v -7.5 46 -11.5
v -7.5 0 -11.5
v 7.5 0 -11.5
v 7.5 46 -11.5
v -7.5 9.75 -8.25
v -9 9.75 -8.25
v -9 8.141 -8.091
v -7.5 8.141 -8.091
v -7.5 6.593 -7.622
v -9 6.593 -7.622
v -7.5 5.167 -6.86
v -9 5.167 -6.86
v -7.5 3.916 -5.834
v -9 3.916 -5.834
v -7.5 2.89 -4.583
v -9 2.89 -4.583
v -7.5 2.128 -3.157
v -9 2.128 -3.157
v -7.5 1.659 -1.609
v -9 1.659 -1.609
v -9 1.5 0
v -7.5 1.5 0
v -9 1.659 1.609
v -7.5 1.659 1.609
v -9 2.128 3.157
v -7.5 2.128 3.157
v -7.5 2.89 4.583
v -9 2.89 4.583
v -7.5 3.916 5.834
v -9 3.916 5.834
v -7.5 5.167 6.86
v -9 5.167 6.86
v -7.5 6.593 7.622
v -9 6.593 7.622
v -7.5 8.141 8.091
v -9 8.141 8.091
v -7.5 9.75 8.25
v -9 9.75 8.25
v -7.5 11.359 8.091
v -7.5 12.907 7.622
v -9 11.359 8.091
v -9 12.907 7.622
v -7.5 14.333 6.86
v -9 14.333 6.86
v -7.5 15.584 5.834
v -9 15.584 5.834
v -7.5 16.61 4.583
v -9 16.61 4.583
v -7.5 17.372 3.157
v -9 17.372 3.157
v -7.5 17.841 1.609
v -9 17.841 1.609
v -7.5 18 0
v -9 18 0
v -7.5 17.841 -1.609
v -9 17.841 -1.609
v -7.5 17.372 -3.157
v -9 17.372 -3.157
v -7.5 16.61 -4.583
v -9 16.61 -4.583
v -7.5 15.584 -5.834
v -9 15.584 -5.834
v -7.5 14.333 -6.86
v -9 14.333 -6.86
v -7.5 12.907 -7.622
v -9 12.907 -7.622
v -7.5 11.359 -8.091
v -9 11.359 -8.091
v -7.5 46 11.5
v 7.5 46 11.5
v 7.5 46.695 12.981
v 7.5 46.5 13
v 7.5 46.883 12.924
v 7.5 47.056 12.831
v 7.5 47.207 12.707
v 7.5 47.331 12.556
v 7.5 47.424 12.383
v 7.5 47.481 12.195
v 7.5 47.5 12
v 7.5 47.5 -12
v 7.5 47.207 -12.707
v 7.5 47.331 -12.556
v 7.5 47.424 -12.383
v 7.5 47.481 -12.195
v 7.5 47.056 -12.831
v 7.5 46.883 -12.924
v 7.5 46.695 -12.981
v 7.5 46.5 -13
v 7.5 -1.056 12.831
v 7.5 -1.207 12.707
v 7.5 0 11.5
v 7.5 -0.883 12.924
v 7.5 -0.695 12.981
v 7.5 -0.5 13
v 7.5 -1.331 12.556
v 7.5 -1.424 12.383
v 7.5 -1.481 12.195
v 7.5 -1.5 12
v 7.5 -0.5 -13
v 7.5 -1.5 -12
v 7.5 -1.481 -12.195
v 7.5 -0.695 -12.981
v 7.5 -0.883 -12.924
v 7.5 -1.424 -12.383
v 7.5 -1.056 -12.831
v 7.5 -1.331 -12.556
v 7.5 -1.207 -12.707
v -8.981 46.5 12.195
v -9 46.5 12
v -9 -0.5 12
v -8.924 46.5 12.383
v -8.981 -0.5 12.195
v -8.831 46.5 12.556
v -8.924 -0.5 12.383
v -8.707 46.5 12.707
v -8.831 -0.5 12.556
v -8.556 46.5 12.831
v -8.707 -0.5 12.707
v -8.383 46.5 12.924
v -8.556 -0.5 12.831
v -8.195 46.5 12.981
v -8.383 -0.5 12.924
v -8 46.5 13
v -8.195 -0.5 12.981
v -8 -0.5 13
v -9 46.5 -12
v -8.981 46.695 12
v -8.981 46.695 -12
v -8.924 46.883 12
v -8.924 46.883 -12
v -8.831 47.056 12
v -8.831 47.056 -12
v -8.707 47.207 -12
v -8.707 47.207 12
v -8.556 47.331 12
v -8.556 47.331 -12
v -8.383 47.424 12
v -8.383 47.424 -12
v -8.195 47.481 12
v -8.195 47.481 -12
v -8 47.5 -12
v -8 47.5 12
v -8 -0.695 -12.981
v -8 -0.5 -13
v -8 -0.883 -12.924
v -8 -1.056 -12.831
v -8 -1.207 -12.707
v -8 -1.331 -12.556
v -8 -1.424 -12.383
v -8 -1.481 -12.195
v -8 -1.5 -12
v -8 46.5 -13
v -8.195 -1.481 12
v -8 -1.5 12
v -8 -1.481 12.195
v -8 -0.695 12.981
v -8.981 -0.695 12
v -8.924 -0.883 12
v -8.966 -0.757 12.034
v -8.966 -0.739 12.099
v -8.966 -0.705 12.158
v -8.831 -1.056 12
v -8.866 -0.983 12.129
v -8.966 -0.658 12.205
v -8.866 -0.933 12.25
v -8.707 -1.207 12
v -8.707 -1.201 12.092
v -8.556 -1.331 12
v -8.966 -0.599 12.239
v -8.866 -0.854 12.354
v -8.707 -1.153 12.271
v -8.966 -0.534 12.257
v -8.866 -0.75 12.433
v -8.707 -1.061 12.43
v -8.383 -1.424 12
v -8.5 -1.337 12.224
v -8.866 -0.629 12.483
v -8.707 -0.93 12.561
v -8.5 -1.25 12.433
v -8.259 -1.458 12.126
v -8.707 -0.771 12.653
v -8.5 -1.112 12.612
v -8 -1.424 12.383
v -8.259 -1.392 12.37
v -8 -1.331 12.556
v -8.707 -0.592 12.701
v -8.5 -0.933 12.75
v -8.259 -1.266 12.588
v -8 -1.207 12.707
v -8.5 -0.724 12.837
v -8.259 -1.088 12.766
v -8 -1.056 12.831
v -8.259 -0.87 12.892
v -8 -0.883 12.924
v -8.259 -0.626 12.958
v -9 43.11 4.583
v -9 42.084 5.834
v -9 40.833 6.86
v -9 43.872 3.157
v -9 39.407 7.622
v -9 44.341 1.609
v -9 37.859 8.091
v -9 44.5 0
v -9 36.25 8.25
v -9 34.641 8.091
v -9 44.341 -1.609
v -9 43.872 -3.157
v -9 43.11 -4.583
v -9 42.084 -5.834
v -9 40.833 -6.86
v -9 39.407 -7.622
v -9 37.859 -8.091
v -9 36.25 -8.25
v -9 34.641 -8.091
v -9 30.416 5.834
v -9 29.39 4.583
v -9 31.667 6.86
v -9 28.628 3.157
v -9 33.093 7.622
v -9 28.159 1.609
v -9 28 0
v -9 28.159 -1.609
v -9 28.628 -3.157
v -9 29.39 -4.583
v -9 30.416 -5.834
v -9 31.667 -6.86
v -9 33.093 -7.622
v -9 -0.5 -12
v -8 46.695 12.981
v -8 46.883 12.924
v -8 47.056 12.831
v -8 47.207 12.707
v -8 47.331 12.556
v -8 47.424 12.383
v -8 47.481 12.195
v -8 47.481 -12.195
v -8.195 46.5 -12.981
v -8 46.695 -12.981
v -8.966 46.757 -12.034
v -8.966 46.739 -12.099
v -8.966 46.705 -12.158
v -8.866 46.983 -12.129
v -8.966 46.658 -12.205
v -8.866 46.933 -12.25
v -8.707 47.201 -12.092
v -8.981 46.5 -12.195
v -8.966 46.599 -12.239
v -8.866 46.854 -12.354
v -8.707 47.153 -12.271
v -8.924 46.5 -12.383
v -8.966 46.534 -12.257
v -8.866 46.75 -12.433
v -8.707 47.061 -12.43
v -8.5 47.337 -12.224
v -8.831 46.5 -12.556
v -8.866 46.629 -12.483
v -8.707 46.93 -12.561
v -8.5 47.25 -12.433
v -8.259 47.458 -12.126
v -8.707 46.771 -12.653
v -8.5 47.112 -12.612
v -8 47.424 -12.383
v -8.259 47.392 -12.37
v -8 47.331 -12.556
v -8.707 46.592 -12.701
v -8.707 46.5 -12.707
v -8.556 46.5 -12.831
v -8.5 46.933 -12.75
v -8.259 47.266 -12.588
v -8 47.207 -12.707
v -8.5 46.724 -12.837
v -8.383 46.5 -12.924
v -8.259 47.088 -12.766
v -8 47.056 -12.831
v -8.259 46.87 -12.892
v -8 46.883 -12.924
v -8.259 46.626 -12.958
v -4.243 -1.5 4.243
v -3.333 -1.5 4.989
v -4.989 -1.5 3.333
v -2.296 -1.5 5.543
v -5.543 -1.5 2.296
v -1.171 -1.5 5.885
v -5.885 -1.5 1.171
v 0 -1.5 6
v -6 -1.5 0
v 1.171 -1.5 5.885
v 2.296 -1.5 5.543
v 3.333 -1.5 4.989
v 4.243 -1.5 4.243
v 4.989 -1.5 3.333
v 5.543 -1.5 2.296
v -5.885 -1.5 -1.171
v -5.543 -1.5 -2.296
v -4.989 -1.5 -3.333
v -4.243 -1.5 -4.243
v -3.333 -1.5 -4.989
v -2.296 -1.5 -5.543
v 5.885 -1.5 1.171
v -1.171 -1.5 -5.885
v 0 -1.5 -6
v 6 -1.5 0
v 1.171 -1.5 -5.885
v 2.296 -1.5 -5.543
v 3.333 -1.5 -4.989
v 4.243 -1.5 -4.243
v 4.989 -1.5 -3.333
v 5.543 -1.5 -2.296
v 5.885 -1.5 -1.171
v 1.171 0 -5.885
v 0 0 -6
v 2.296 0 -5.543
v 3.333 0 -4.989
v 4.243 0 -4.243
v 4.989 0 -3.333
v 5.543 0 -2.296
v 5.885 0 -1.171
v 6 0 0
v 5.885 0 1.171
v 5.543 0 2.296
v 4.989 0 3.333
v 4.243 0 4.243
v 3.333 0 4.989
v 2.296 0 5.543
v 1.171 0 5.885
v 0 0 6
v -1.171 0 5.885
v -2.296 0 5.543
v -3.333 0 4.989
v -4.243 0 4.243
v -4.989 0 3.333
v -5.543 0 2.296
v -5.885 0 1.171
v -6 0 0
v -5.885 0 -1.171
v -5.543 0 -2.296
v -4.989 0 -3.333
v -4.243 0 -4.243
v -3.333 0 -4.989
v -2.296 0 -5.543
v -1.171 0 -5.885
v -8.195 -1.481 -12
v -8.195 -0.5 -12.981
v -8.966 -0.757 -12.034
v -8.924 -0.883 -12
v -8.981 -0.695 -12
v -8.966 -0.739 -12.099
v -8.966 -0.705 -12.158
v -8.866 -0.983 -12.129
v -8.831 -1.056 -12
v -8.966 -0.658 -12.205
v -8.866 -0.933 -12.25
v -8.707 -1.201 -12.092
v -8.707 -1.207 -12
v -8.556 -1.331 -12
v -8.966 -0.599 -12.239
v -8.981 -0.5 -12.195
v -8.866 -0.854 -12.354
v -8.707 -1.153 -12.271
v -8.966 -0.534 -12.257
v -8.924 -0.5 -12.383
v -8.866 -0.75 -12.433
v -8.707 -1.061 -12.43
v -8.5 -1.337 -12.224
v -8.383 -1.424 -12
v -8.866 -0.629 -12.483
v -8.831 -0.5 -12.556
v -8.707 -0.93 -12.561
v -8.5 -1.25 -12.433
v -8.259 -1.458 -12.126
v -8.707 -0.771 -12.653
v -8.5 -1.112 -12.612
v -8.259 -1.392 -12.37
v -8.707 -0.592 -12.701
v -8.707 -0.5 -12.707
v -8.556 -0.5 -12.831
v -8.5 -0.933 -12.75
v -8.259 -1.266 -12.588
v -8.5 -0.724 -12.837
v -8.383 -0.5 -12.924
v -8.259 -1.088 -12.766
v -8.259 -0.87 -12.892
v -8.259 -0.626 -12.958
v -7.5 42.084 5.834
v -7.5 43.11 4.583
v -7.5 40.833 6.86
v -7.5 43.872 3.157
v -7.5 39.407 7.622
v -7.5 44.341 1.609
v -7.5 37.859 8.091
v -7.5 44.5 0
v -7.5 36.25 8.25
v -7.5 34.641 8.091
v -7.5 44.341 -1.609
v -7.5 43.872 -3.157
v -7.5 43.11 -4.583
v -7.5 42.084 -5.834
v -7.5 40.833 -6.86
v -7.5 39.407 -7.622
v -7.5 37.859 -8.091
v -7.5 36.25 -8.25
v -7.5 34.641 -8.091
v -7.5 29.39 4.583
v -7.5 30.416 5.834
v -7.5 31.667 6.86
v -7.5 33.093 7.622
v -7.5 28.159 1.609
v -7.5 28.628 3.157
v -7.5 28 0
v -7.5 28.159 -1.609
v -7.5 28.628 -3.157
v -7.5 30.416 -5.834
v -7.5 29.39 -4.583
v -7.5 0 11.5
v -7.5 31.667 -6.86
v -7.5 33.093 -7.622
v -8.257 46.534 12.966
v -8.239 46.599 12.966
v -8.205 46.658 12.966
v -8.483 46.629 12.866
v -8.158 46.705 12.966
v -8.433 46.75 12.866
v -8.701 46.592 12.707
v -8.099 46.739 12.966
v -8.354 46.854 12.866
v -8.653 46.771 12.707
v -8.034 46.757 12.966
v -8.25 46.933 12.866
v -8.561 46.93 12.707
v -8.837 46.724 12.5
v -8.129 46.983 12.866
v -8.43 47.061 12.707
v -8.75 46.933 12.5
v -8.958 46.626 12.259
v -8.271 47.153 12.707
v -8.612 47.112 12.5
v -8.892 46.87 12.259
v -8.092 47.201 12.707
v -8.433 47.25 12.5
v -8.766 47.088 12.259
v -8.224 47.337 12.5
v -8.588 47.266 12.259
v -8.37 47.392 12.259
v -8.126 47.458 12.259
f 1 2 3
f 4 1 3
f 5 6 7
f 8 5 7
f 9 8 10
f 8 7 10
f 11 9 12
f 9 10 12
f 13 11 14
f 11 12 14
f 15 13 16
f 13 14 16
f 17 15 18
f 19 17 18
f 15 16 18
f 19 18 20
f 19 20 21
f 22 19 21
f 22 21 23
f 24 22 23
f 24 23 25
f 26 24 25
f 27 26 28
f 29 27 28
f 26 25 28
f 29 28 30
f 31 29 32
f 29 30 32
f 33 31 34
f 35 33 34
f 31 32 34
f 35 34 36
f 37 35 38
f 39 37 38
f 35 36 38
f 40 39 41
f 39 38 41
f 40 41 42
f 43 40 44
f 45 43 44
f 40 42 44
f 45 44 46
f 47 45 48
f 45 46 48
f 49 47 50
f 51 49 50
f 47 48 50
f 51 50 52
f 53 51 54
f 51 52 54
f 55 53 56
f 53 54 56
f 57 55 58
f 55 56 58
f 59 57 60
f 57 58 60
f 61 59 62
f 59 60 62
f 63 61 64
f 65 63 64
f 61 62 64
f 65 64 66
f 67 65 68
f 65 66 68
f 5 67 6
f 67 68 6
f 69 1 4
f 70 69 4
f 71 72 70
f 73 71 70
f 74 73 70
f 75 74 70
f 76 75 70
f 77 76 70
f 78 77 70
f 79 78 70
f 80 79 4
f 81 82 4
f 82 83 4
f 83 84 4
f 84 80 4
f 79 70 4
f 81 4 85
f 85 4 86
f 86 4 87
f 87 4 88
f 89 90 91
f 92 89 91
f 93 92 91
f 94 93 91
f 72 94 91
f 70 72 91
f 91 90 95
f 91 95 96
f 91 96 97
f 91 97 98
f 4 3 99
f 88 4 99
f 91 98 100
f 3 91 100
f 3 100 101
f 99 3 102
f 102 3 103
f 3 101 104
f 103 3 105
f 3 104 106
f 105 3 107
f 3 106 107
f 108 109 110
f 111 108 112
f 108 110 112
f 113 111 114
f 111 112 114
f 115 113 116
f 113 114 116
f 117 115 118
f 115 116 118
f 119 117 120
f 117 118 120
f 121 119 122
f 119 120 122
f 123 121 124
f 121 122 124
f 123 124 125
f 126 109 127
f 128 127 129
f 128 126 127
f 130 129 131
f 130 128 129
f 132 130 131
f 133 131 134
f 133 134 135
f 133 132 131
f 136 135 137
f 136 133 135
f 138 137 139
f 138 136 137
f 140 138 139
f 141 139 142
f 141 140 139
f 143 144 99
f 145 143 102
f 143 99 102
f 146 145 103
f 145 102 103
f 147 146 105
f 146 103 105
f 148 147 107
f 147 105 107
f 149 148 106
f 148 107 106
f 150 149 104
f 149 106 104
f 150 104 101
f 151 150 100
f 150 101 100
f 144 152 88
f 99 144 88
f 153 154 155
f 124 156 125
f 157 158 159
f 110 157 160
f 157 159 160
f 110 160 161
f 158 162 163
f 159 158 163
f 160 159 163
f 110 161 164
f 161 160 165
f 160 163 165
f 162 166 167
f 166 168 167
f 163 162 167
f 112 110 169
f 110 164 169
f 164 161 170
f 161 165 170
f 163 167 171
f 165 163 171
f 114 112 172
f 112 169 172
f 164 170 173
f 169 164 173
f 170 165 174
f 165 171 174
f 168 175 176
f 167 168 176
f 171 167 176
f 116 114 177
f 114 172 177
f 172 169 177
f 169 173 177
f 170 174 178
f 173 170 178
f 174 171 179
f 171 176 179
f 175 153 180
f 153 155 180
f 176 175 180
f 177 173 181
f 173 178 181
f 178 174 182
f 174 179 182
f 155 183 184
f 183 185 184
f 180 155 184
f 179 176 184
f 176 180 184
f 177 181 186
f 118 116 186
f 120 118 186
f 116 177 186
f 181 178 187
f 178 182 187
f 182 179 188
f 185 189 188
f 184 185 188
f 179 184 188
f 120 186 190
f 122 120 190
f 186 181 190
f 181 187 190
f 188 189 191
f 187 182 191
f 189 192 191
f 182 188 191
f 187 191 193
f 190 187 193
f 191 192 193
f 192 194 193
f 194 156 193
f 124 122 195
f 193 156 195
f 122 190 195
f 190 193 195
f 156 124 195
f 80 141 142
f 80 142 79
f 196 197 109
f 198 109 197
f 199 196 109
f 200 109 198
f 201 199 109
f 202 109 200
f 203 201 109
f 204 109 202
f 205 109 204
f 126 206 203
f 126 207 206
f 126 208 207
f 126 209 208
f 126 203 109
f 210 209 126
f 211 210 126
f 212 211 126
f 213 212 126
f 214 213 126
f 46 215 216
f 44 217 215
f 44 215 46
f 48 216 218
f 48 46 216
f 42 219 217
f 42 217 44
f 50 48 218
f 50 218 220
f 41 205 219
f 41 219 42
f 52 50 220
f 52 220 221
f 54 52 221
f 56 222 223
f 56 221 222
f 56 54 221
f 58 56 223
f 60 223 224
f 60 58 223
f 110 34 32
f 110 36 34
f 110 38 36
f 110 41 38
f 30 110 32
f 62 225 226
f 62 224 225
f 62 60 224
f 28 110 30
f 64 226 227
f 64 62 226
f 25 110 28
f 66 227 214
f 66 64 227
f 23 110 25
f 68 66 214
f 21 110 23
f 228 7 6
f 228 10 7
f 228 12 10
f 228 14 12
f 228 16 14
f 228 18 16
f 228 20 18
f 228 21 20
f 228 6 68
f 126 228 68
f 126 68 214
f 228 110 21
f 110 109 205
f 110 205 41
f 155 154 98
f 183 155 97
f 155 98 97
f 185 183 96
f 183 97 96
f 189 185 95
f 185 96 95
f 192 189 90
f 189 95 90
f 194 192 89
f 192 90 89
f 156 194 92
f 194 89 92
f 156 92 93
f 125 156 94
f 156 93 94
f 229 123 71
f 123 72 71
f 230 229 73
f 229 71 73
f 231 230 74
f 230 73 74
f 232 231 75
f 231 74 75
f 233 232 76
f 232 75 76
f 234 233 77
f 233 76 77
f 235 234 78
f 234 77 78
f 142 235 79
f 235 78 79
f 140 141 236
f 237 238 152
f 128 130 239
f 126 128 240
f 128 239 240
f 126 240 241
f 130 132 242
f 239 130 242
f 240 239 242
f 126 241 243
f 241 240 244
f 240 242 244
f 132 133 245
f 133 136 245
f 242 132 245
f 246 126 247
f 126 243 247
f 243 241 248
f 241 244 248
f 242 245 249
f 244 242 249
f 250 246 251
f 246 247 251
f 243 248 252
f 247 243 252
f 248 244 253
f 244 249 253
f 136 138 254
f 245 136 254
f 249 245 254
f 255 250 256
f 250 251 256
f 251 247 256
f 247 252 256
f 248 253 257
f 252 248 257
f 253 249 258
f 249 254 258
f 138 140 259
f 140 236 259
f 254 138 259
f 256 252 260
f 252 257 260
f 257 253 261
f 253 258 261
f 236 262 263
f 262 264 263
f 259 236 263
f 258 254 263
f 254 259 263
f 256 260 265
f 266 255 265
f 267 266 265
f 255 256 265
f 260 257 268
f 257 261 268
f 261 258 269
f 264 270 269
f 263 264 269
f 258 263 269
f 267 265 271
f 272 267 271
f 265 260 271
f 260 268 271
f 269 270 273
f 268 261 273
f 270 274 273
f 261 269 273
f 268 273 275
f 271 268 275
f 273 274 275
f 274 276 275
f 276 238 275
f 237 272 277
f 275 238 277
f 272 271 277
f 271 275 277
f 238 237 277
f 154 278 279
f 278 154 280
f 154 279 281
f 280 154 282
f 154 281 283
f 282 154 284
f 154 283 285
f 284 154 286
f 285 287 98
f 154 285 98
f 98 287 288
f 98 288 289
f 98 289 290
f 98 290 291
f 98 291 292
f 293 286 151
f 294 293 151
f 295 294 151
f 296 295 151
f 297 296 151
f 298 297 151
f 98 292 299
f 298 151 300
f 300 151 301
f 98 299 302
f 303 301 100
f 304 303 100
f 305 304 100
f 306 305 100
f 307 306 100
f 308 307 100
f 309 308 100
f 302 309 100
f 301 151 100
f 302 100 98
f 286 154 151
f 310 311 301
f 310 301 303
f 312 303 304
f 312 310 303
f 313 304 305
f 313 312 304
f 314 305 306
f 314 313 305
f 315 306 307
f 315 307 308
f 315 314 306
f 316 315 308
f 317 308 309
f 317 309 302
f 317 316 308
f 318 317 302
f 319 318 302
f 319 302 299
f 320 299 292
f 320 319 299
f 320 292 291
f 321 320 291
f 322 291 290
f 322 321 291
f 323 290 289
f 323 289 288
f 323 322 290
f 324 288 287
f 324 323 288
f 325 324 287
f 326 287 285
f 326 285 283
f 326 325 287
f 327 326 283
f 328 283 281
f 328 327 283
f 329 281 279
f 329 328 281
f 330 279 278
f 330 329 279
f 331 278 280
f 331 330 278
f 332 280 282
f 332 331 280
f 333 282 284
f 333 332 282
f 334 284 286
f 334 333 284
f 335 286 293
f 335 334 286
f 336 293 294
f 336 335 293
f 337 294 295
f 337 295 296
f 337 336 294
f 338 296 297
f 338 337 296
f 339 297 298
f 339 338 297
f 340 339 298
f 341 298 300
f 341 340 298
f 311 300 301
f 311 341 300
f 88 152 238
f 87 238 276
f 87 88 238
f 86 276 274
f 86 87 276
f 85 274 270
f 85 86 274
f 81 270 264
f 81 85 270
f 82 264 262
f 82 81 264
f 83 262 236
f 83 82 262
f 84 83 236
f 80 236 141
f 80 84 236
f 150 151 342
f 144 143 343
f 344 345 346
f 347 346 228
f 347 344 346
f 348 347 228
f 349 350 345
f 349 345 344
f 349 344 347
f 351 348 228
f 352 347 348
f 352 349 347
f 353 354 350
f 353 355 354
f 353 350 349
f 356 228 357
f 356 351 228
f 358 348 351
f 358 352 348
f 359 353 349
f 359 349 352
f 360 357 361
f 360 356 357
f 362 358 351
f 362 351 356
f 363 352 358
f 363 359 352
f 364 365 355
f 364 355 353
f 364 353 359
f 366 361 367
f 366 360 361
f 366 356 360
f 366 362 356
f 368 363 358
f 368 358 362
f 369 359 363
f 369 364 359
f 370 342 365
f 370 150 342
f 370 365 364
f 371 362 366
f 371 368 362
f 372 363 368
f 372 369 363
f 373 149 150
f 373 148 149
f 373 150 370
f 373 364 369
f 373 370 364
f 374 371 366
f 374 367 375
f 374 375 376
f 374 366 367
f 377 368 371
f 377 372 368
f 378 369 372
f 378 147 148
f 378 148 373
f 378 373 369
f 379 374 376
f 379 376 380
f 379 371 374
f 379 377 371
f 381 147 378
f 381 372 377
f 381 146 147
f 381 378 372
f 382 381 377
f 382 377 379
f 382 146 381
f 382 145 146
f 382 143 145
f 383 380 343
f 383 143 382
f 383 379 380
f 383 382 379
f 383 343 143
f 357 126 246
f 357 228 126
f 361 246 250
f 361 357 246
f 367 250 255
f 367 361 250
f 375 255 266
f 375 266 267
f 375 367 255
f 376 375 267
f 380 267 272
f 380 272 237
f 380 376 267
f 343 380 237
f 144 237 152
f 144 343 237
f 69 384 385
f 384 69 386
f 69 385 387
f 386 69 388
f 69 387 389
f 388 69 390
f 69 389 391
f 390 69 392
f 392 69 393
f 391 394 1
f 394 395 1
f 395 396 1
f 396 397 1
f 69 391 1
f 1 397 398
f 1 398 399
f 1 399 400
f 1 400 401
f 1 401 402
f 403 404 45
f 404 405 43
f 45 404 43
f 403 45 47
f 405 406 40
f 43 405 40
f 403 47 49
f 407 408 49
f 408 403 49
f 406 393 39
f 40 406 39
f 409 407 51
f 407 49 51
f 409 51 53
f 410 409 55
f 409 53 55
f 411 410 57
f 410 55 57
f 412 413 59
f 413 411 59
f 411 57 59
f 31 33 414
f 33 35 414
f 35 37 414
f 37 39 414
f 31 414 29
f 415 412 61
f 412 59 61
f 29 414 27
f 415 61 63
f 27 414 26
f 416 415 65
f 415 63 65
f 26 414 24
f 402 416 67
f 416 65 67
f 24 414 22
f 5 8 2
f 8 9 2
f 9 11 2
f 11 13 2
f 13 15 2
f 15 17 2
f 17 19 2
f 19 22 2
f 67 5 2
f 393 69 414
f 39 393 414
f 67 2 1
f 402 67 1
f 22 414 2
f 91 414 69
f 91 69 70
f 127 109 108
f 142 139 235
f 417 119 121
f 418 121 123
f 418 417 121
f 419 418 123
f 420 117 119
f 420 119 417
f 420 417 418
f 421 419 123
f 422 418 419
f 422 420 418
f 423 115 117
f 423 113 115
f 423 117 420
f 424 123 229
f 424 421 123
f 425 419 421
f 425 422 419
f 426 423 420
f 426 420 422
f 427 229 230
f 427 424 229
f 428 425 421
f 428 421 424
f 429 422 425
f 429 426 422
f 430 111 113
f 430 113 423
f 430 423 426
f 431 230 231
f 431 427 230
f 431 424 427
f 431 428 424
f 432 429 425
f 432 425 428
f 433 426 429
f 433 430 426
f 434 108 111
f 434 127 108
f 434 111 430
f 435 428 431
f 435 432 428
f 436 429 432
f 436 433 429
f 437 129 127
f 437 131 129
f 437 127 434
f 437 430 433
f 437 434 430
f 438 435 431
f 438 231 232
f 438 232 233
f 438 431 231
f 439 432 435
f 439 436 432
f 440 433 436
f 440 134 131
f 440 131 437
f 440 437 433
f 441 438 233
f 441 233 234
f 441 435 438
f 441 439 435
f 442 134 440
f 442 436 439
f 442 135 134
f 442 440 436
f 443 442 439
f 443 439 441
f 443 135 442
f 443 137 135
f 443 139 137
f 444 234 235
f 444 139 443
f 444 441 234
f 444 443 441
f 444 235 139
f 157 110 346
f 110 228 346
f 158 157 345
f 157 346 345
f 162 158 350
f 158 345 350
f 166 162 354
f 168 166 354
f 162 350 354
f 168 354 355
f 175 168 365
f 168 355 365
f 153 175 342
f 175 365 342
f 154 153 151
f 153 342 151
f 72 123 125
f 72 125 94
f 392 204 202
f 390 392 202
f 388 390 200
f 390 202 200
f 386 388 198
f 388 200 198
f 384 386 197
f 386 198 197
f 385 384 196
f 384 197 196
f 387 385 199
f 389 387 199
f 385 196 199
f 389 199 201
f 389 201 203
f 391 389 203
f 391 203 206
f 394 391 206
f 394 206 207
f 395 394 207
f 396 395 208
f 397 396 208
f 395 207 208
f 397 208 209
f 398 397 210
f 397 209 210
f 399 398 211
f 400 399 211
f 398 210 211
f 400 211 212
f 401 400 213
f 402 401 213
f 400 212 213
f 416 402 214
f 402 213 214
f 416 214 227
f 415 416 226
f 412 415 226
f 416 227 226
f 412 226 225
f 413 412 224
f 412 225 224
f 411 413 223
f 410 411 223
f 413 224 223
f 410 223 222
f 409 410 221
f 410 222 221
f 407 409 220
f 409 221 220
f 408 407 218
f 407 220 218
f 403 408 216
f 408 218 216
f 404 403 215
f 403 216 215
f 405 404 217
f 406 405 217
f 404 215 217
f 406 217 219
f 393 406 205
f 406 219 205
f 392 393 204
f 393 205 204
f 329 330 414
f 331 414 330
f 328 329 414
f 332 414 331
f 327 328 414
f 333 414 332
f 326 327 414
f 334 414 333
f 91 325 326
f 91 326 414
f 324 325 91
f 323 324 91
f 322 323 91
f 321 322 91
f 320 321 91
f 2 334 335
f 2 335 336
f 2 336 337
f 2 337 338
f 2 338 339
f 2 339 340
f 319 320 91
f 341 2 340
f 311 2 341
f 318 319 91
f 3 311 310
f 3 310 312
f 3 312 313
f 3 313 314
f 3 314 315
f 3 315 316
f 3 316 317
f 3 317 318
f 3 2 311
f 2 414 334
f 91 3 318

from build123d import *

# Parameters (mm, degrees)
SKETCH_1_W          = 15
SKETCH_1_H          = 23
EXTRUDE_1_DEPTH     = 46
SHELL_1_T           = 1.5
SKETCH_2_R          = 6
CUT_EXTRUDE_4_DEPTH = 1.5
SKETCH_3_R          = 8.25
CUT_EXTRUDE_5_DEPTH = 1.5
FILLET_2_R          = 1


with BuildPart() as part:
    # 草图1 → 凸台-拉伸1 (new body)
    with BuildSketch(Plane(origin=(0, 0, 0), x_dir=(1, 0, 0), z_dir=(0, 1, 0))):
        Rectangle(SKETCH_1_W, SKETCH_1_H)
    extrude(amount=EXTRUDE_1_DEPTH)

    # 抽壳1
    shell_1_openings = [part.faces().sort_by_distance(p)[0] for p in [
        (7.5, 23, 0),
    ]]
    offset(amount=SHELL_1_T, openings=shell_1_openings, kind=Kind.INTERSECTION)

    # 草图2 → 切除-拉伸4 (cut)
    with BuildSketch(Plane(origin=(0, 0, 0), x_dir=(-1, 0, 0), z_dir=(0, -1, 0))):
        with Locations(Location((0, 0, 0), (0, 0, 90))):
            Circle(SKETCH_2_R)
    extrude(amount=CUT_EXTRUDE_4_DEPTH, mode=Mode.SUBTRACT)

    # 草图3 → 切除-拉伸5 (cut)
    with BuildSketch(Plane.ZY.offset(9)):
        with Locations((0, 36.25)):
            Circle(SKETCH_3_R)
        with Locations(Location((0, 9.75, 0), (0, 0, 180))):
            Circle(SKETCH_3_R)
    extrude(amount=-CUT_EXTRUDE_5_DEPTH, mode=Mode.SUBTRACT)

    # 圆角2
    fillet_2_edges = [part.edges().sort_by_distance(p)[0] for p in [
        (-0.75, 47.5, -13),
        (-9, 47.5, 0),
        (-0.75, -1.5, -13),
        (-0.75, -1.5, 13),
        (-9, -1.5, 0),
        (-9, 23, -13),
        (-9, 23, 13),
        (-0.75, 47.5, 13),
    ]]
    fillet(fillet_2_edges, radius=FILLET_2_R)


solid = part.part
